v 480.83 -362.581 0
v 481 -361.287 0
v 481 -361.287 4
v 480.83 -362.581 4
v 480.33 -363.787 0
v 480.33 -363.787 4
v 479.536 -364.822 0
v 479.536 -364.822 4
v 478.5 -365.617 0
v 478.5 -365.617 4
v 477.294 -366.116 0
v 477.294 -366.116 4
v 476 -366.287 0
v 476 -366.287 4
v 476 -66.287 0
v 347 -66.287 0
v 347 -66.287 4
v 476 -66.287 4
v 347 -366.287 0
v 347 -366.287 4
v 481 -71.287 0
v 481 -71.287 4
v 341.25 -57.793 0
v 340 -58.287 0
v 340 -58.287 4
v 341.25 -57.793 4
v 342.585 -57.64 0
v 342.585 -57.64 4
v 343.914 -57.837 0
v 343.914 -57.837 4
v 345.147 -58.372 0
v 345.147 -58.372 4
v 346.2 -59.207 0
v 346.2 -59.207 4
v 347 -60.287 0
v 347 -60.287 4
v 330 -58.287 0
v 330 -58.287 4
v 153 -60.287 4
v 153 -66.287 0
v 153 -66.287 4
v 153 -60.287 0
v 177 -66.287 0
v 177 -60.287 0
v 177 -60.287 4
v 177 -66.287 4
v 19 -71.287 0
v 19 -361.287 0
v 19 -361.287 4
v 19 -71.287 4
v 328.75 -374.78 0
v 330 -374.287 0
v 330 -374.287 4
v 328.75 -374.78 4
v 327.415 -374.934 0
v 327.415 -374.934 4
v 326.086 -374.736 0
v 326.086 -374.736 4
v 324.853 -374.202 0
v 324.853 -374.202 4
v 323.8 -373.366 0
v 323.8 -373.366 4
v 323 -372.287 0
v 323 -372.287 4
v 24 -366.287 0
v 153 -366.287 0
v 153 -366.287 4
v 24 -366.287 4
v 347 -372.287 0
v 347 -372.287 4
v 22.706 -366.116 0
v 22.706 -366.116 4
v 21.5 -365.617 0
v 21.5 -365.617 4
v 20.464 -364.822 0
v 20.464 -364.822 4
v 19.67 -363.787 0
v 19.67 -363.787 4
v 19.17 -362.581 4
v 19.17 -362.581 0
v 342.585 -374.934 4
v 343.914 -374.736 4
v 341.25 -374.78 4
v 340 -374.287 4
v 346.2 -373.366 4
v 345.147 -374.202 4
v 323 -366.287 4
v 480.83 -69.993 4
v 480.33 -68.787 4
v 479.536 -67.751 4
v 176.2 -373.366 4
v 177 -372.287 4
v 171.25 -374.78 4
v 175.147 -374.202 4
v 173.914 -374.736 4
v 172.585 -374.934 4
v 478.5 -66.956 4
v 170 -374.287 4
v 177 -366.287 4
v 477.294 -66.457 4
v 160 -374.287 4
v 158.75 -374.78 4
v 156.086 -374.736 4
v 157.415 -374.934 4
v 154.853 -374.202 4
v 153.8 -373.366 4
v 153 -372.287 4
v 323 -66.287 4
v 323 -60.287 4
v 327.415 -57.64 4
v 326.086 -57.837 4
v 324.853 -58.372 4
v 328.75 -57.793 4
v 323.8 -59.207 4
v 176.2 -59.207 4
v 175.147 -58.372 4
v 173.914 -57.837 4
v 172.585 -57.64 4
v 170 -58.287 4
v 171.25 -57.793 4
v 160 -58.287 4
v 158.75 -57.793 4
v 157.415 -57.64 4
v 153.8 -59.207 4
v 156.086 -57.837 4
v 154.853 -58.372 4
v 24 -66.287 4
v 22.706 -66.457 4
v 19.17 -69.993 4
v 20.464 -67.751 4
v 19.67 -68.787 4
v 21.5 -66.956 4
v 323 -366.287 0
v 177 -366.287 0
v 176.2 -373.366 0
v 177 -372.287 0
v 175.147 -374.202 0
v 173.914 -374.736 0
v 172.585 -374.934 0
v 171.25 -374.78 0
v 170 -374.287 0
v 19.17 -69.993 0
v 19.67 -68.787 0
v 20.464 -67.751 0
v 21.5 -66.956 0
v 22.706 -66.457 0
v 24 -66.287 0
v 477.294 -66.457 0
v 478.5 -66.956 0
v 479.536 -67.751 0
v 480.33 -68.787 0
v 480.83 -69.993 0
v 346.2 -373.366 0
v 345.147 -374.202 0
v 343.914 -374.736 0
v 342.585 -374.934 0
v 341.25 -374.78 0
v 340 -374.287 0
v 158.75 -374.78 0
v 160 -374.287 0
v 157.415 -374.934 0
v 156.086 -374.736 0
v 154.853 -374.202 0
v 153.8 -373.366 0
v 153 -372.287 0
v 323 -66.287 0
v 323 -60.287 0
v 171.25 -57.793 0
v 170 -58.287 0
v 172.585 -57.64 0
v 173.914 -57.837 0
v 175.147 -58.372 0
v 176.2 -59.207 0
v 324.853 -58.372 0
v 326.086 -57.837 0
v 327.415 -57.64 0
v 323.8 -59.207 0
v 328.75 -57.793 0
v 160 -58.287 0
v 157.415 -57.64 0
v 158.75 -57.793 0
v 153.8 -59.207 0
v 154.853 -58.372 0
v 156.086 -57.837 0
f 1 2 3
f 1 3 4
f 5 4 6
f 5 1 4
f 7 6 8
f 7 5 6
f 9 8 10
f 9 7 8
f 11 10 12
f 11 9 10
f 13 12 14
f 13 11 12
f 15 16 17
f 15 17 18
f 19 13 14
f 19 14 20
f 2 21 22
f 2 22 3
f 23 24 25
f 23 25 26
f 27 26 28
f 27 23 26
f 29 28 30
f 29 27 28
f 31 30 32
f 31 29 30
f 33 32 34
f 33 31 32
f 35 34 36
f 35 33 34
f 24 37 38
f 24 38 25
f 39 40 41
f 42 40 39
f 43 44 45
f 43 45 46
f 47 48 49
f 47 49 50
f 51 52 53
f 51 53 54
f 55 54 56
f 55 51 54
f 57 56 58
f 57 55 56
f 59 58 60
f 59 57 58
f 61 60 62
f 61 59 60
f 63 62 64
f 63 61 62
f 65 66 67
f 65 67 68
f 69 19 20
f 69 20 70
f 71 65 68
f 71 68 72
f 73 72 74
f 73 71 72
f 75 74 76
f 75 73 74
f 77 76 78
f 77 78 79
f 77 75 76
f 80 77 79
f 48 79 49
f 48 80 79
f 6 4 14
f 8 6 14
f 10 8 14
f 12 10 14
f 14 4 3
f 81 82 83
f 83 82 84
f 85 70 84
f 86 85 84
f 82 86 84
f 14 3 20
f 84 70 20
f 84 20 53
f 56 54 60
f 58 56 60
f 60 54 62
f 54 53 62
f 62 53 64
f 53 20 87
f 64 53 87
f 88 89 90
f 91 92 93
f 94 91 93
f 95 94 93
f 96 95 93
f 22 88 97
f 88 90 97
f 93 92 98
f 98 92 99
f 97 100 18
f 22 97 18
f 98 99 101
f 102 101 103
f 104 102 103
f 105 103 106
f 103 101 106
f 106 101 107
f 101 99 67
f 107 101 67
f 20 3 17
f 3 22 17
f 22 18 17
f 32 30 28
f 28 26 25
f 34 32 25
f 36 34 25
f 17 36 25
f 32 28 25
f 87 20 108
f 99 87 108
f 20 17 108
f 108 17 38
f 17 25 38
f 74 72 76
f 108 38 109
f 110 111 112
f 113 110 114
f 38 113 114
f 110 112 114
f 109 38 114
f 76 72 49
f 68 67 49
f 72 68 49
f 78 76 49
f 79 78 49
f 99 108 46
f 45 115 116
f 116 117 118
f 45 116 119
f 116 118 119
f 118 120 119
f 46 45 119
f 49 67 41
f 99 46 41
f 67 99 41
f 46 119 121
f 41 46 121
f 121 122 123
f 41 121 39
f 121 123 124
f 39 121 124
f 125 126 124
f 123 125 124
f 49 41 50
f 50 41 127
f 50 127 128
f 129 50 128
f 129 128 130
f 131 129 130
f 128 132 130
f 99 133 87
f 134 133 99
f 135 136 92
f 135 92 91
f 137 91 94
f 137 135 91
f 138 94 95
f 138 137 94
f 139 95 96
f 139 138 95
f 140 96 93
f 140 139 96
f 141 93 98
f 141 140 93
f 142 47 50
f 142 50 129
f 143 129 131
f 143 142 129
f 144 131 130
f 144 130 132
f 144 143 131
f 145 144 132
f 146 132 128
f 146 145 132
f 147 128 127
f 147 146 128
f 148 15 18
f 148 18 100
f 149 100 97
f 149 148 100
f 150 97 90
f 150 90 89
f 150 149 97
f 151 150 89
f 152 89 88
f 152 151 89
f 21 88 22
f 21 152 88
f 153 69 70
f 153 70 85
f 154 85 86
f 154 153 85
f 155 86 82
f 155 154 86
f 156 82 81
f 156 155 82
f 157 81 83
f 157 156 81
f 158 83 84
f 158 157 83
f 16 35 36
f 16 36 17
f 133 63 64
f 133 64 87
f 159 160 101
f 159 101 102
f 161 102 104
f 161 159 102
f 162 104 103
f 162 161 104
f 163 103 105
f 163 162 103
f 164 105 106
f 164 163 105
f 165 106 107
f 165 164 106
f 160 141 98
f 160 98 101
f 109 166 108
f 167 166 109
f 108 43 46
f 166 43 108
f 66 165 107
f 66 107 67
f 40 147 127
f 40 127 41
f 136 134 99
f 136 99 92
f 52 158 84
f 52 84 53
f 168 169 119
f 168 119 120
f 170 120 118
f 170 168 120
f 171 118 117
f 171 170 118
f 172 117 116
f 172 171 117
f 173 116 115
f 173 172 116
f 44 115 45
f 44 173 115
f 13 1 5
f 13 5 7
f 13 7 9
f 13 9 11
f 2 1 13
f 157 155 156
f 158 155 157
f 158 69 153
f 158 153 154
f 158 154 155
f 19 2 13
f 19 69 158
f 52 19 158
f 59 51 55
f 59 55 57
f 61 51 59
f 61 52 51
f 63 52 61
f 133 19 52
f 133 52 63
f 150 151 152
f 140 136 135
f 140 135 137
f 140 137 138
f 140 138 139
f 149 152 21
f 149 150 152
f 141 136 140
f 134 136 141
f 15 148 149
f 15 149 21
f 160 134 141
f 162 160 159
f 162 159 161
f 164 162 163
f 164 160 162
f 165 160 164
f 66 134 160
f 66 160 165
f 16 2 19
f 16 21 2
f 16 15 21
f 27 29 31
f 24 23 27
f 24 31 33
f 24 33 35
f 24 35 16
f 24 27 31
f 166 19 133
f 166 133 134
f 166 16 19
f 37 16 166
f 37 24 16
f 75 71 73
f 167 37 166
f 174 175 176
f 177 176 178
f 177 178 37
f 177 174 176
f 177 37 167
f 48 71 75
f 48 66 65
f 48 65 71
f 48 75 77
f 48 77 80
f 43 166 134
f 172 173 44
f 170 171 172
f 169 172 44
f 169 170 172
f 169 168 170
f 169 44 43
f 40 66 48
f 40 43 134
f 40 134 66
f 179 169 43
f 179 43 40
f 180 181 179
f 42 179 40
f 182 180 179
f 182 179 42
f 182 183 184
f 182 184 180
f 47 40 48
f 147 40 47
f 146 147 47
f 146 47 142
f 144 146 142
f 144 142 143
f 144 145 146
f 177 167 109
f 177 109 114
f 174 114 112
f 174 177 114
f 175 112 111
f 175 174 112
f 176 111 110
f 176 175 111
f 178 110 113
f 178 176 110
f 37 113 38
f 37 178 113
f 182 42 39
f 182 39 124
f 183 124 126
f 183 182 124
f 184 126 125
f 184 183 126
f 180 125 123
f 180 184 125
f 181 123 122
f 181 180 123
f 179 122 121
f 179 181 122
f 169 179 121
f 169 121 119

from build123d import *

# Parameters (mm, degrees)
EXTRUDE_1_DEPTH = 4


with BuildPart() as part:
    # Эскиз1 → Бобышка-Вытянуть1 (new body)
    with BuildSketch(Plane.XY):
        with BuildLine():
            Line((177, -66.286621906), (323, -66.286621906))
            Line((323, -66.286621906), (323, -60.286621906))
            ThreePointArc((323, -60.286621906), (326.085786438, -57.836874437), (330, -58.286621906))
            Line((330, -58.286621906), (340, -58.286621906))
            ThreePointArc((340, -58.286621906), (343.914213562, -57.836874437), (347, -60.286621906))
            Line((347, -60.286621906), (347, -66.286621906))
            Line((347, -66.286621906), (476, -66.286621906))
            ThreePointArc((476, -66.286621906), (479.535533906, -67.751088), (481, -71.286621906))
            Line((481, -71.286621906), (481, -361.286621906))
            ThreePointArc((481, -361.286621906), (479.535533906, -364.822155812), (476, -366.286621906))
            Line((476, -366.286621906), (347, -366.286621906))
            Line((347, -366.286621906), (347, -372.286621906))
            ThreePointArc((347, -372.286621906), (343.914213562, -374.736369374), (340, -374.286621906))
            Line((340, -374.286621906), (330, -374.286621906))
            ThreePointArc((330, -374.286621906), (326.085786438, -374.736369374), (323, -372.286621906))
            Line((323, -372.286621906), (323, -366.286621906))
            Line((323, -366.286621906), (177, -366.286621906))
            Line((177, -366.286621906), (177, -372.286621906))
            ThreePointArc((177, -372.286621906), (173.914213562, -374.736369374), (170, -374.286621906))
            Line((170, -374.286621906), (160, -374.286621906))
            ThreePointArc((160, -374.286621906), (156.085786438, -374.736369374), (153, -372.286621906))
            Line((153, -372.286621906), (153, -366.286621906))
            Line((153, -366.286621906), (24, -366.286621906))
            ThreePointArc((24, -366.286621906), (20.464466094, -364.822155812), (19, -361.286621906))
            Line((19, -361.286621906), (19, -71.286621906))
            ThreePointArc((19, -71.286621906), (20.464466094, -67.751088), (24, -66.286621906))
            Line((24, -66.286621906), (153, -66.286621906))
            Line((153, -66.286621906), (153, -60.286621906))
            ThreePointArc((153, -60.286621906), (156.085786438, -57.836874437), (160, -58.286621906))
            Line((160, -58.286621906), (170, -58.286621906))
            ThreePointArc((170, -58.286621906), (173.914213562, -57.836874437), (177, -60.286621906))
            Line((177, -60.286621906), (177, -66.286621906))
        make_face()
    extrude(amount=EXTRUDE_1_DEPTH)


solid = part.part
